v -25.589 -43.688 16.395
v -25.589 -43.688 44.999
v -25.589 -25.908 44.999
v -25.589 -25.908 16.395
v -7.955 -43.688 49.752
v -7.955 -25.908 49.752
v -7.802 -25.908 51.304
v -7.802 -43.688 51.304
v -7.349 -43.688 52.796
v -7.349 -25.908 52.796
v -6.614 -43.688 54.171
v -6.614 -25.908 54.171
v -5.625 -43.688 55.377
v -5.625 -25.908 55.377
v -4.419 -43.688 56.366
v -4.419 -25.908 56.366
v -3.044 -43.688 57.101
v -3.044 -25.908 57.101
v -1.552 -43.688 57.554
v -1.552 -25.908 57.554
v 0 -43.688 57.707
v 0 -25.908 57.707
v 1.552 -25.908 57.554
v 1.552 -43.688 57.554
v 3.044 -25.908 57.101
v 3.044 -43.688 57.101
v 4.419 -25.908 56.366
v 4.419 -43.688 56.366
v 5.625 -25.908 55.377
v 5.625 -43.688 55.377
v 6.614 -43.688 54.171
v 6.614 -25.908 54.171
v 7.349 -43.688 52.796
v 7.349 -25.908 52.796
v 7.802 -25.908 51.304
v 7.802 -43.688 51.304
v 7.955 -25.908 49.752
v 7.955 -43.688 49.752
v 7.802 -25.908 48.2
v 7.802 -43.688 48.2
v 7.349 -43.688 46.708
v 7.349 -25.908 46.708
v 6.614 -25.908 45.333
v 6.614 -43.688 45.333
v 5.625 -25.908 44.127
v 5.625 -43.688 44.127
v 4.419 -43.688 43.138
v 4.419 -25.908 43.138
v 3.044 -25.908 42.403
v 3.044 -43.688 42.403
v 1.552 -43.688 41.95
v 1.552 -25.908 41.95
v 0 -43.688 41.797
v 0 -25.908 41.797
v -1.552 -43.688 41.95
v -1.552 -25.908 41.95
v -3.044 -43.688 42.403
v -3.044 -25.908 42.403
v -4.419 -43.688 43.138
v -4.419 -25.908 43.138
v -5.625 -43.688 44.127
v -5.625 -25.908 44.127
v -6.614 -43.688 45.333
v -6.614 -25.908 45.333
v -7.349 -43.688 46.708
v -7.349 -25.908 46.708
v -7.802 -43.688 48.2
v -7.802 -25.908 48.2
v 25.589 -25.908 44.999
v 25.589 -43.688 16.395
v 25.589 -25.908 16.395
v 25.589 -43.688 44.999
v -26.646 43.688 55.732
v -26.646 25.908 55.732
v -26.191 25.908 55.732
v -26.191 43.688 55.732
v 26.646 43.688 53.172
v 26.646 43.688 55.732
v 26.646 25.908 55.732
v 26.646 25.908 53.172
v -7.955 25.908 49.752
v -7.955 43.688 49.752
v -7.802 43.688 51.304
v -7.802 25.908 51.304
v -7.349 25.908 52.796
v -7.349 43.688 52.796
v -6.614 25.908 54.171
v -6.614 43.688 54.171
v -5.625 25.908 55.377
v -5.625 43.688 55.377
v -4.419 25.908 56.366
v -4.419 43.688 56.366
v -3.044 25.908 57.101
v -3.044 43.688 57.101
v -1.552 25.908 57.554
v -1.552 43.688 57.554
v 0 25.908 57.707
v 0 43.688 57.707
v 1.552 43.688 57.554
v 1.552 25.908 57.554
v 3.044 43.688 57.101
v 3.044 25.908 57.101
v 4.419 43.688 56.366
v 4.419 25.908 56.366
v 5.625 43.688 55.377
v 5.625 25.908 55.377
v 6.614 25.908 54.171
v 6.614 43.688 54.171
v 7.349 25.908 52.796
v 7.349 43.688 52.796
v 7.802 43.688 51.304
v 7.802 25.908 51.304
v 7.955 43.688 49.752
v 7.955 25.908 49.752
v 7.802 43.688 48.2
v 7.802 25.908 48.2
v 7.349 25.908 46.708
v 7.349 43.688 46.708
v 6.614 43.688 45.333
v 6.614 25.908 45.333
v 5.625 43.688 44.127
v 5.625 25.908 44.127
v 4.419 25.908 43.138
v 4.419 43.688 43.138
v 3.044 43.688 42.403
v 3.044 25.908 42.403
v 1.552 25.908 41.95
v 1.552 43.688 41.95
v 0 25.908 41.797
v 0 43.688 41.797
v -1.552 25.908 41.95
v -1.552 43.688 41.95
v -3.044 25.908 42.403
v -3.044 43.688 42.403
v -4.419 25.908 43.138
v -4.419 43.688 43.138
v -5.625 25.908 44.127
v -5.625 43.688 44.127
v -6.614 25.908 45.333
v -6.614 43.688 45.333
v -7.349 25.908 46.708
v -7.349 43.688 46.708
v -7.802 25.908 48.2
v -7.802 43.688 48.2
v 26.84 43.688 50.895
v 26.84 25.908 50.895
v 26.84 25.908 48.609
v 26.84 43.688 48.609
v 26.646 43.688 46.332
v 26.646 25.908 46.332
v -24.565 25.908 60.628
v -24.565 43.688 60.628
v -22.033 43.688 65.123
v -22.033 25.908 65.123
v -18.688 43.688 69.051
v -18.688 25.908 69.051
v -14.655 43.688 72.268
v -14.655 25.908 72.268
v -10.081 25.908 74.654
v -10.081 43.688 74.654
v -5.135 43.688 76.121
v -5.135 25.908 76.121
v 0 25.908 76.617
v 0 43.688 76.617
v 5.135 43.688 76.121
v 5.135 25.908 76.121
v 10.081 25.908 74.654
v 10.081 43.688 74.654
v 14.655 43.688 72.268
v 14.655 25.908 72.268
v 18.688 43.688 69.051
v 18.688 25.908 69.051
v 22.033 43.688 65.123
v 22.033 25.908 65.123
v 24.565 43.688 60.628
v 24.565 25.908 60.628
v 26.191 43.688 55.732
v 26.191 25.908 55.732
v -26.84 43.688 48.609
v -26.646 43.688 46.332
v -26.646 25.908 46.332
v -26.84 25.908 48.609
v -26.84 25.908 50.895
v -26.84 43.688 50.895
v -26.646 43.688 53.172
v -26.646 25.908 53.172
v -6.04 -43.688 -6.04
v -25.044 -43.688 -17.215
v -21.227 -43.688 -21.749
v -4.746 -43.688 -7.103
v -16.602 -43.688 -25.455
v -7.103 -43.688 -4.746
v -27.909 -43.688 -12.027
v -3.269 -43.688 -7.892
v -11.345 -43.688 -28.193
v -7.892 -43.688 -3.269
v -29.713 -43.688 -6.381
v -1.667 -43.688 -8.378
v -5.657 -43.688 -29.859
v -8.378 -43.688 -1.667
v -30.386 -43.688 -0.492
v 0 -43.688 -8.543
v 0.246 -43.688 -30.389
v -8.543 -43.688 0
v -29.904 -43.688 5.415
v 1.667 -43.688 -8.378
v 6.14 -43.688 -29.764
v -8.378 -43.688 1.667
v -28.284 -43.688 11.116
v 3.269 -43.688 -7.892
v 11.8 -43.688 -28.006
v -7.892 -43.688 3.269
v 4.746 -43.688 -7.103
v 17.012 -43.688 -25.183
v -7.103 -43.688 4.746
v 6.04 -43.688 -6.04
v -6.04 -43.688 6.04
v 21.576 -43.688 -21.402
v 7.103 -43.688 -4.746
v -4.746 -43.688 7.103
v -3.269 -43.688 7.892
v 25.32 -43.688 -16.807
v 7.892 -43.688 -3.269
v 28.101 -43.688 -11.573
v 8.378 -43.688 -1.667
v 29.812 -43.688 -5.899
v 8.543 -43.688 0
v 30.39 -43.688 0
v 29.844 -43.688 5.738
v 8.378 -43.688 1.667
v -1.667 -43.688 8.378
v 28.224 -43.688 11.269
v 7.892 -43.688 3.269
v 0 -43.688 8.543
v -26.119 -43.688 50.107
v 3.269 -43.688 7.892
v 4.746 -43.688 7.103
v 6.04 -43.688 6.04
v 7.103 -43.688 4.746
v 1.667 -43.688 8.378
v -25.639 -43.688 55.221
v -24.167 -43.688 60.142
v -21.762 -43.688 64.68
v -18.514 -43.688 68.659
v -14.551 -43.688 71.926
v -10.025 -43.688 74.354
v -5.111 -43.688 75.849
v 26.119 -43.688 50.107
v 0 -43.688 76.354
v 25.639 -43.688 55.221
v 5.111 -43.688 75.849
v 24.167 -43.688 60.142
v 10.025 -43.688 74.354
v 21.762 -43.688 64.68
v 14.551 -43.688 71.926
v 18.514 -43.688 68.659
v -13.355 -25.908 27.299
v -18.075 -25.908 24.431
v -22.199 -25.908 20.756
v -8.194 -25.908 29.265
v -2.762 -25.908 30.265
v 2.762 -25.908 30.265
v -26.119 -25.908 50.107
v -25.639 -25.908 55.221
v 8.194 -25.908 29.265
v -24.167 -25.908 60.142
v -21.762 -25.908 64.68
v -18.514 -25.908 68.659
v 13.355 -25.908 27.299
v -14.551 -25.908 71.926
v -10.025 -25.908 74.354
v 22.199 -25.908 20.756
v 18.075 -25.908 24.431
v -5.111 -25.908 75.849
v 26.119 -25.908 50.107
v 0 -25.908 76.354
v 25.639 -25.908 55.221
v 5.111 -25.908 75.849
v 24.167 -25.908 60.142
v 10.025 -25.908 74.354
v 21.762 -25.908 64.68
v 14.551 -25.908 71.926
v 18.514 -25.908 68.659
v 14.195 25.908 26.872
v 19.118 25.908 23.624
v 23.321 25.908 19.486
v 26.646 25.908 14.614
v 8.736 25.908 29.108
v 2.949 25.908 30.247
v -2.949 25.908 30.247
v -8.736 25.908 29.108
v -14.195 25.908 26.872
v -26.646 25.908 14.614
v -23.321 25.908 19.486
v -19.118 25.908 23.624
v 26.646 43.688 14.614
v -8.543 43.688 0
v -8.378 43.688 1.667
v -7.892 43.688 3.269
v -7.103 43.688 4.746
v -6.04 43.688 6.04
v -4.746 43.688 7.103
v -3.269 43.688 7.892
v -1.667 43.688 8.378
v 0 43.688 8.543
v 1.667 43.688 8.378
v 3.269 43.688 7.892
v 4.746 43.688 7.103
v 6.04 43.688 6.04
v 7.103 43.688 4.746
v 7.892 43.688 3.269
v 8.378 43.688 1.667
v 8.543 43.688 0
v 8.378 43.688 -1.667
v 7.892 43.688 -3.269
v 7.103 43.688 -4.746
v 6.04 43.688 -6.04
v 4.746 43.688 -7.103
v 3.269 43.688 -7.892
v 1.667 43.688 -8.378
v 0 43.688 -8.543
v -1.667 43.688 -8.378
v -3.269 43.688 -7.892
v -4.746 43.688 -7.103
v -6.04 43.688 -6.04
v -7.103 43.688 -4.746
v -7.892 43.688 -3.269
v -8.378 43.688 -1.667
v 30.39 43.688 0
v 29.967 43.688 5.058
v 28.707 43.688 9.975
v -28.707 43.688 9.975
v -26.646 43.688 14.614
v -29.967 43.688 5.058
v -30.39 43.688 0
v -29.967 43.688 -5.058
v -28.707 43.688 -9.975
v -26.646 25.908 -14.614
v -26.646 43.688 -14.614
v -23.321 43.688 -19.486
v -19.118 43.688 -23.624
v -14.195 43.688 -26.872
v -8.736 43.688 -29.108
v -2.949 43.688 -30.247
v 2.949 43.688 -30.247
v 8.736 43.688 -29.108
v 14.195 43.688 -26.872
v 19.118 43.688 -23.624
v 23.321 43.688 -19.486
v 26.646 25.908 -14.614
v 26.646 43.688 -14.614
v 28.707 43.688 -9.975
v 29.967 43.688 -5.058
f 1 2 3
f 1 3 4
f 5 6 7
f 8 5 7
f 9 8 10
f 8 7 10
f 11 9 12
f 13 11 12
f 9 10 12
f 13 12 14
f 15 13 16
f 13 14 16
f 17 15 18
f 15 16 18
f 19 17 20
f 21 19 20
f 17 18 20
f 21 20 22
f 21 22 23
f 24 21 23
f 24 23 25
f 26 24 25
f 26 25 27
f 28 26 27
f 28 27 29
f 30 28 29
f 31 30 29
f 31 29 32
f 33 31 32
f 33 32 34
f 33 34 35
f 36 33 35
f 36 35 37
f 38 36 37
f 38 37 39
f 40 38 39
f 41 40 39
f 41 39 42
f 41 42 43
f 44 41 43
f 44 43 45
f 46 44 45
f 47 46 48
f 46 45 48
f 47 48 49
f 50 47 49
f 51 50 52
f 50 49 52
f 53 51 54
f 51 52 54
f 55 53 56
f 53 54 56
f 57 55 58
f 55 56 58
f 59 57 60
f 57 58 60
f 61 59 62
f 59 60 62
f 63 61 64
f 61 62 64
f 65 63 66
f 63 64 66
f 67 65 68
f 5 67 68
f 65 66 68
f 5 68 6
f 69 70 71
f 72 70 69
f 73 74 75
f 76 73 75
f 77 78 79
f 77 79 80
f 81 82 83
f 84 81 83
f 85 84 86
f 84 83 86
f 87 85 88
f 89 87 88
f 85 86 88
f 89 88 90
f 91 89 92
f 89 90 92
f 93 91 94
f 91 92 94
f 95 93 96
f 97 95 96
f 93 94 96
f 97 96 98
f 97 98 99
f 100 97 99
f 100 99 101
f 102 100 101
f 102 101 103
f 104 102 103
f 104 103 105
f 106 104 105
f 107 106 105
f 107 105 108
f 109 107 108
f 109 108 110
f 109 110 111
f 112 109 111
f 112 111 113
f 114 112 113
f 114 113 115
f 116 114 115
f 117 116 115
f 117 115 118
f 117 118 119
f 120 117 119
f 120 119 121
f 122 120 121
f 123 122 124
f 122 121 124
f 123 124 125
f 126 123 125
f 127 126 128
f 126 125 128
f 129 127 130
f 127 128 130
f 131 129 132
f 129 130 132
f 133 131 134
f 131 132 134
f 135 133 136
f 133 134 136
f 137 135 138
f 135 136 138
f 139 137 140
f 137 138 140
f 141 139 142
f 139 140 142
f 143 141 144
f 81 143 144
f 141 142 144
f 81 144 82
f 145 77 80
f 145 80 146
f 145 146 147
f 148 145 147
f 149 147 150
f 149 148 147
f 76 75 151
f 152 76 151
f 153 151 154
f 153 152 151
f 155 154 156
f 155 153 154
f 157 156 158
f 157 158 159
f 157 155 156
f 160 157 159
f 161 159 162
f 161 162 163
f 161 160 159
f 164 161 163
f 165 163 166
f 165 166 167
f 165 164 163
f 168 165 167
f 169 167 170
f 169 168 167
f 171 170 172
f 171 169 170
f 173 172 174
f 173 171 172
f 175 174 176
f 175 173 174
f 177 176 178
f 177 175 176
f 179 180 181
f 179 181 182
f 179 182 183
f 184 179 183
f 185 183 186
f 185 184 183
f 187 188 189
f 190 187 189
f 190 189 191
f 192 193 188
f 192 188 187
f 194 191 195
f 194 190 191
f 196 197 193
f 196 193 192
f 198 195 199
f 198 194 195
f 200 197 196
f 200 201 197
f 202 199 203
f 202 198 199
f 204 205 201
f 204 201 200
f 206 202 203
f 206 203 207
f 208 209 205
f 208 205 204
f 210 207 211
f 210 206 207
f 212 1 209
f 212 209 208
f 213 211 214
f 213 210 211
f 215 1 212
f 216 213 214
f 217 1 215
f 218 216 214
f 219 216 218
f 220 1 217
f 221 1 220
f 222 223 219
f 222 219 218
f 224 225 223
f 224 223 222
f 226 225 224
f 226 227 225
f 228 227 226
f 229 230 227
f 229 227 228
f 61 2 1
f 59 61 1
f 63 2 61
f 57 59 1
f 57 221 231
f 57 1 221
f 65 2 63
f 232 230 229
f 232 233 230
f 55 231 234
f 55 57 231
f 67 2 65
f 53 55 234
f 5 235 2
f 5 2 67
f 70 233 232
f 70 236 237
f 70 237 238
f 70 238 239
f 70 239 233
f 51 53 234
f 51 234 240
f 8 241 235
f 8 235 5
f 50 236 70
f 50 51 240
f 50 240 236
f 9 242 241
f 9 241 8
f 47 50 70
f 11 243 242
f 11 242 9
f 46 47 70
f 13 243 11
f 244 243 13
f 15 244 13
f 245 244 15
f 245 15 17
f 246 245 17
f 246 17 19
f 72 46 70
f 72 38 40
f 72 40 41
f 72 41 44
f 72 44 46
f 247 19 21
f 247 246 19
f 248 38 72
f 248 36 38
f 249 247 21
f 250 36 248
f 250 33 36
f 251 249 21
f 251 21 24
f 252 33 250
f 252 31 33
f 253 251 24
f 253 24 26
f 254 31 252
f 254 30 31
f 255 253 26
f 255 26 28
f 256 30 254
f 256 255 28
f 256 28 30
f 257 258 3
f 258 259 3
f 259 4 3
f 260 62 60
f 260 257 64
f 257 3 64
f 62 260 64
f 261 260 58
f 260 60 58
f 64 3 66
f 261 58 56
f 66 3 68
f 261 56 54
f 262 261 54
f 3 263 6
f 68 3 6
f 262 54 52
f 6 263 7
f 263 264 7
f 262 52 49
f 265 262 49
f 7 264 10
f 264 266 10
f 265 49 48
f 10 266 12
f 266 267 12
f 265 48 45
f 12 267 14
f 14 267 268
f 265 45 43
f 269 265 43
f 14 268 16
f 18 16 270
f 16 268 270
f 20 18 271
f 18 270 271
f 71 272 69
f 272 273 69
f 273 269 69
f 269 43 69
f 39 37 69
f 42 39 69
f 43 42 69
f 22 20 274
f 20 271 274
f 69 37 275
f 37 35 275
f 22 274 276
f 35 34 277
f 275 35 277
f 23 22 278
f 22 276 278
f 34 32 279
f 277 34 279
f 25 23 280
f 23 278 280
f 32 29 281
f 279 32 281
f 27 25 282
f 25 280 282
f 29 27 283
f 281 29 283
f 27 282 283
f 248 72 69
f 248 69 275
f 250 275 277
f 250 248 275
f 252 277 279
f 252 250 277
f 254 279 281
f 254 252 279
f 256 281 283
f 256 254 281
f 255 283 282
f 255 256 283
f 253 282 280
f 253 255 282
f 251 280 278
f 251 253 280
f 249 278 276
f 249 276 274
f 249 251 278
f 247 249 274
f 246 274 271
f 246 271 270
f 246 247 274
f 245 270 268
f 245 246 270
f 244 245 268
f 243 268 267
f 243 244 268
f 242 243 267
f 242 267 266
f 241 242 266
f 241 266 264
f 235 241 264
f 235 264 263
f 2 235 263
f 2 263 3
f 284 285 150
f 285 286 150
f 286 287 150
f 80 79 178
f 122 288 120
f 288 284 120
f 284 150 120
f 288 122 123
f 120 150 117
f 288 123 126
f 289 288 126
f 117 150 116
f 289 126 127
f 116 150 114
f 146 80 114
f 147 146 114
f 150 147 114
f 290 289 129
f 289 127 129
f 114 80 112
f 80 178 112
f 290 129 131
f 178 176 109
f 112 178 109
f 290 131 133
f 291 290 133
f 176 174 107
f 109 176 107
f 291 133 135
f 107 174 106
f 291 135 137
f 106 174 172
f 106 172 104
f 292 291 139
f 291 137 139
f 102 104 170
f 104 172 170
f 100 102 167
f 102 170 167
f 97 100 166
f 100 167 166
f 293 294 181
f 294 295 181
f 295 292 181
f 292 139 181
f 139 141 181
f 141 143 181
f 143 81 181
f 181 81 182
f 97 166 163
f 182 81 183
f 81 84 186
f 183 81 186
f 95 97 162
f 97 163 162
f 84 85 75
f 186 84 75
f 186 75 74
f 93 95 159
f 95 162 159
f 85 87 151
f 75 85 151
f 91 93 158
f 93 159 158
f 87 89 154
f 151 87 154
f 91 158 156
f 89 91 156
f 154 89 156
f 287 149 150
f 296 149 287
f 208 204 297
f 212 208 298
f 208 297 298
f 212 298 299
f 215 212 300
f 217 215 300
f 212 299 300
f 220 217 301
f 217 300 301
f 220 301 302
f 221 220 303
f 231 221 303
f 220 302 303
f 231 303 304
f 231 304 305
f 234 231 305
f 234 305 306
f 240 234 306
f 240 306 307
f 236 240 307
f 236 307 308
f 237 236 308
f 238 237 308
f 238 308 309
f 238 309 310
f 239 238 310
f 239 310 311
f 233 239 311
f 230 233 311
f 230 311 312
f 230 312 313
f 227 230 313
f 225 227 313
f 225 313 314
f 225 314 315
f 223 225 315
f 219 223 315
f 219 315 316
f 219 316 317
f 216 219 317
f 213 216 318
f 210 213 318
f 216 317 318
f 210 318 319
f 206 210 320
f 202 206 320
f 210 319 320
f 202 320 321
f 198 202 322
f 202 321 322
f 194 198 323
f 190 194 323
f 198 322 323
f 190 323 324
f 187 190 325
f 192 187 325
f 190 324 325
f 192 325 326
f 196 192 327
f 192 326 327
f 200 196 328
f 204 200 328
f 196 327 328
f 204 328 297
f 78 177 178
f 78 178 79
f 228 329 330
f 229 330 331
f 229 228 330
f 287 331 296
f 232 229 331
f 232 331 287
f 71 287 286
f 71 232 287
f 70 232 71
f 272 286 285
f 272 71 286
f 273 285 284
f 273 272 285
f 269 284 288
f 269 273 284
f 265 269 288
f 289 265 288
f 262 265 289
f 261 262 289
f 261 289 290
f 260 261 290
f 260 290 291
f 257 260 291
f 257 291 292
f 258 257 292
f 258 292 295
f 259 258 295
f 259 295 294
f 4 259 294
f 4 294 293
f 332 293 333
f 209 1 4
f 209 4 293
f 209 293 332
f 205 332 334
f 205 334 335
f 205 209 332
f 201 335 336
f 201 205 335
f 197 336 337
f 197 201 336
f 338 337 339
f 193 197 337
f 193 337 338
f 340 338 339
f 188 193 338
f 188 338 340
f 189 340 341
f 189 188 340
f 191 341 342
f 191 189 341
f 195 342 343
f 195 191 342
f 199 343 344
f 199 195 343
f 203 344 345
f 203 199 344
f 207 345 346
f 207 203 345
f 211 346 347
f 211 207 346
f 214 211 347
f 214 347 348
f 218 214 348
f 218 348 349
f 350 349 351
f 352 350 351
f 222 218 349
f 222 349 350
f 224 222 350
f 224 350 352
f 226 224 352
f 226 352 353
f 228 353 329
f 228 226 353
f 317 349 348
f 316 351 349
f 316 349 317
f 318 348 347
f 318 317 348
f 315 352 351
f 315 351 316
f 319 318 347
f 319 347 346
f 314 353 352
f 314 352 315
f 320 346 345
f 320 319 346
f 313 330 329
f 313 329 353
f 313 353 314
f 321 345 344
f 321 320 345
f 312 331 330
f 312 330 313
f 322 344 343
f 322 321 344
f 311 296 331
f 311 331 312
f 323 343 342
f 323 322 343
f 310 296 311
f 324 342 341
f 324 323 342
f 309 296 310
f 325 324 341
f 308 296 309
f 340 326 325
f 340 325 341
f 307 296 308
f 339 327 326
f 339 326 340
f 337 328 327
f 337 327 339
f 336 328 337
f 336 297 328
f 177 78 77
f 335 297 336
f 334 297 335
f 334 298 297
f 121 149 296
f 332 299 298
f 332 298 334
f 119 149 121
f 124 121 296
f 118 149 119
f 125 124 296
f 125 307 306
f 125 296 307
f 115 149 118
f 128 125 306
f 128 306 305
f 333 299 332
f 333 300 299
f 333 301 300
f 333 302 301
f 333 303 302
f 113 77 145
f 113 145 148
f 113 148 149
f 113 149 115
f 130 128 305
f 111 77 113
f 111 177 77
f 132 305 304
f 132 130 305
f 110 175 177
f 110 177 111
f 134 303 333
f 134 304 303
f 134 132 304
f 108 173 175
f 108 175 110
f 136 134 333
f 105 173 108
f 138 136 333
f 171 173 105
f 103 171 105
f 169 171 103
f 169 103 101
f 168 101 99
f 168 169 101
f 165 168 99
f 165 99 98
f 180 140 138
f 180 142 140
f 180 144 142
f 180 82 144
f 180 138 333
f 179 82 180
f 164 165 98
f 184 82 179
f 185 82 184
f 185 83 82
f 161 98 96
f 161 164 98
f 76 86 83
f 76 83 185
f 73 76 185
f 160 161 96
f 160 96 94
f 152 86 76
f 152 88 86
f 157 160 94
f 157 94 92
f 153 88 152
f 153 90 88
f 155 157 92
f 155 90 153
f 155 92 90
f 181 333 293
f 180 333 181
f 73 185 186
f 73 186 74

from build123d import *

# Parameters (mm, degrees)
F0_R      = 30.39041
F1_DEPTH  = 43.688
F3_DEPTH  = 17.78
F5_DEPTH  = 17.78
F6_R      = 8.542504
F7_DEPTH  = 104.14
F8_R      = 26.119062
F9_DEPTH  = 17.78
F10_R     = 26.864742
F11_DEPTH = 17.78
F12_R     = 7.954549
F13_DEPTH = 97.79


with BuildPart() as f1:
    # F0 (on Front) → F1 (new body, symmetric)
    with BuildSketch(Plane.XZ):
        Circle(F0_R)
    extrude(amount=F1_DEPTH, both=True)

    # F2 (on face) → F3 (join)
    with BuildSketch(Plane.XZ.offset(43.688)):
        with BuildLine():
            Line((-25.588728, 54.975592), (-25.588728, 16.394938))
            ThreePointArc((-25.588728, 16.394938), (0, 30.39041), (25.588728, 16.394938))
            Line((25.588728, 16.394938), (25.588728, 54.975592))
            Line((25.588728, 54.975592), (-25.588728, 54.975592))
        make_face()
        with BuildLine():
            Line((-25.588728, 16.394938), (-25.588728, -16.394938))
            Line((-25.588728, -16.394938), (25.588728, -16.394938))
            Line((25.588728, -16.394938), (25.588728, 16.394938))
            ThreePointArc((25.588728, 16.394938), (0, 30.39041), (-25.588728, 16.394938))
        make_face()
    extrude(amount=-F3_DEPTH)

    # F4 (on face) → F5 (join)
    with BuildSketch(Plane(origin=(0, 43.688, 0), x_dir=(-1, 0, 0), z_dir=(0, 1, 0))):
        with BuildLine():
            Line((-26.646163, 55.732163), (-26.646163, 14.613658))
            ThreePointArc((-26.646163, 14.613658), (0, 30.39041), (26.646163, 14.613658))
            Line((26.646163, 14.613658), (26.646163, 55.732163))
            Line((26.646163, 55.732163), (-26.646163, 55.732163))
        make_face()
        with BuildLine():
            Line((-26.646163, 14.613658), (-26.646163, -14.613658))
            Line((-26.646163, -14.613658), (26.646163, -14.613658))
            Line((26.646163, -14.613658), (26.646163, 14.613658))
            ThreePointArc((26.646163, 14.613658), (0, 30.39041), (-26.646163, 14.613658))
        make_face()
    extrude(amount=-F5_DEPTH)

    # F6 (on face) → F7 (cut)
    with BuildSketch(Plane(origin=(0, 43.688, 0), x_dir=(-1, 0, 0), z_dir=(0, 1, 0))):
        Circle(F6_R)
    extrude(amount=-F7_DEPTH, mode=Mode.SUBTRACT)

    # F8 (on face) → F9 (join)
    with BuildSketch(Plane.XZ.offset(43.688)):
        with Locations((0, 50.235286)):
            Circle(F8_R)
    extrude(amount=-F9_DEPTH)

    # F10 (on face) → F11 (join)
    with BuildSketch(Plane(origin=(0, 43.688, 0), x_dir=(-1, 0, 0), z_dir=(0, 1, 0))):
        with Locations((0, 49.751956)):
            Circle(F10_R)
    extrude(amount=-F11_DEPTH)

    # F12 (on face) → F13 (cut)
    with BuildSketch(Plane(origin=(0, 43.688, 0), x_dir=(-1, 0, 0), z_dir=(0, 1, 0))):
        with Locations((0, 49.751956)):
            Circle(F12_R)
    extrude(amount=-F13_DEPTH, mode=Mode.SUBTRACT)


solid = f1.part
